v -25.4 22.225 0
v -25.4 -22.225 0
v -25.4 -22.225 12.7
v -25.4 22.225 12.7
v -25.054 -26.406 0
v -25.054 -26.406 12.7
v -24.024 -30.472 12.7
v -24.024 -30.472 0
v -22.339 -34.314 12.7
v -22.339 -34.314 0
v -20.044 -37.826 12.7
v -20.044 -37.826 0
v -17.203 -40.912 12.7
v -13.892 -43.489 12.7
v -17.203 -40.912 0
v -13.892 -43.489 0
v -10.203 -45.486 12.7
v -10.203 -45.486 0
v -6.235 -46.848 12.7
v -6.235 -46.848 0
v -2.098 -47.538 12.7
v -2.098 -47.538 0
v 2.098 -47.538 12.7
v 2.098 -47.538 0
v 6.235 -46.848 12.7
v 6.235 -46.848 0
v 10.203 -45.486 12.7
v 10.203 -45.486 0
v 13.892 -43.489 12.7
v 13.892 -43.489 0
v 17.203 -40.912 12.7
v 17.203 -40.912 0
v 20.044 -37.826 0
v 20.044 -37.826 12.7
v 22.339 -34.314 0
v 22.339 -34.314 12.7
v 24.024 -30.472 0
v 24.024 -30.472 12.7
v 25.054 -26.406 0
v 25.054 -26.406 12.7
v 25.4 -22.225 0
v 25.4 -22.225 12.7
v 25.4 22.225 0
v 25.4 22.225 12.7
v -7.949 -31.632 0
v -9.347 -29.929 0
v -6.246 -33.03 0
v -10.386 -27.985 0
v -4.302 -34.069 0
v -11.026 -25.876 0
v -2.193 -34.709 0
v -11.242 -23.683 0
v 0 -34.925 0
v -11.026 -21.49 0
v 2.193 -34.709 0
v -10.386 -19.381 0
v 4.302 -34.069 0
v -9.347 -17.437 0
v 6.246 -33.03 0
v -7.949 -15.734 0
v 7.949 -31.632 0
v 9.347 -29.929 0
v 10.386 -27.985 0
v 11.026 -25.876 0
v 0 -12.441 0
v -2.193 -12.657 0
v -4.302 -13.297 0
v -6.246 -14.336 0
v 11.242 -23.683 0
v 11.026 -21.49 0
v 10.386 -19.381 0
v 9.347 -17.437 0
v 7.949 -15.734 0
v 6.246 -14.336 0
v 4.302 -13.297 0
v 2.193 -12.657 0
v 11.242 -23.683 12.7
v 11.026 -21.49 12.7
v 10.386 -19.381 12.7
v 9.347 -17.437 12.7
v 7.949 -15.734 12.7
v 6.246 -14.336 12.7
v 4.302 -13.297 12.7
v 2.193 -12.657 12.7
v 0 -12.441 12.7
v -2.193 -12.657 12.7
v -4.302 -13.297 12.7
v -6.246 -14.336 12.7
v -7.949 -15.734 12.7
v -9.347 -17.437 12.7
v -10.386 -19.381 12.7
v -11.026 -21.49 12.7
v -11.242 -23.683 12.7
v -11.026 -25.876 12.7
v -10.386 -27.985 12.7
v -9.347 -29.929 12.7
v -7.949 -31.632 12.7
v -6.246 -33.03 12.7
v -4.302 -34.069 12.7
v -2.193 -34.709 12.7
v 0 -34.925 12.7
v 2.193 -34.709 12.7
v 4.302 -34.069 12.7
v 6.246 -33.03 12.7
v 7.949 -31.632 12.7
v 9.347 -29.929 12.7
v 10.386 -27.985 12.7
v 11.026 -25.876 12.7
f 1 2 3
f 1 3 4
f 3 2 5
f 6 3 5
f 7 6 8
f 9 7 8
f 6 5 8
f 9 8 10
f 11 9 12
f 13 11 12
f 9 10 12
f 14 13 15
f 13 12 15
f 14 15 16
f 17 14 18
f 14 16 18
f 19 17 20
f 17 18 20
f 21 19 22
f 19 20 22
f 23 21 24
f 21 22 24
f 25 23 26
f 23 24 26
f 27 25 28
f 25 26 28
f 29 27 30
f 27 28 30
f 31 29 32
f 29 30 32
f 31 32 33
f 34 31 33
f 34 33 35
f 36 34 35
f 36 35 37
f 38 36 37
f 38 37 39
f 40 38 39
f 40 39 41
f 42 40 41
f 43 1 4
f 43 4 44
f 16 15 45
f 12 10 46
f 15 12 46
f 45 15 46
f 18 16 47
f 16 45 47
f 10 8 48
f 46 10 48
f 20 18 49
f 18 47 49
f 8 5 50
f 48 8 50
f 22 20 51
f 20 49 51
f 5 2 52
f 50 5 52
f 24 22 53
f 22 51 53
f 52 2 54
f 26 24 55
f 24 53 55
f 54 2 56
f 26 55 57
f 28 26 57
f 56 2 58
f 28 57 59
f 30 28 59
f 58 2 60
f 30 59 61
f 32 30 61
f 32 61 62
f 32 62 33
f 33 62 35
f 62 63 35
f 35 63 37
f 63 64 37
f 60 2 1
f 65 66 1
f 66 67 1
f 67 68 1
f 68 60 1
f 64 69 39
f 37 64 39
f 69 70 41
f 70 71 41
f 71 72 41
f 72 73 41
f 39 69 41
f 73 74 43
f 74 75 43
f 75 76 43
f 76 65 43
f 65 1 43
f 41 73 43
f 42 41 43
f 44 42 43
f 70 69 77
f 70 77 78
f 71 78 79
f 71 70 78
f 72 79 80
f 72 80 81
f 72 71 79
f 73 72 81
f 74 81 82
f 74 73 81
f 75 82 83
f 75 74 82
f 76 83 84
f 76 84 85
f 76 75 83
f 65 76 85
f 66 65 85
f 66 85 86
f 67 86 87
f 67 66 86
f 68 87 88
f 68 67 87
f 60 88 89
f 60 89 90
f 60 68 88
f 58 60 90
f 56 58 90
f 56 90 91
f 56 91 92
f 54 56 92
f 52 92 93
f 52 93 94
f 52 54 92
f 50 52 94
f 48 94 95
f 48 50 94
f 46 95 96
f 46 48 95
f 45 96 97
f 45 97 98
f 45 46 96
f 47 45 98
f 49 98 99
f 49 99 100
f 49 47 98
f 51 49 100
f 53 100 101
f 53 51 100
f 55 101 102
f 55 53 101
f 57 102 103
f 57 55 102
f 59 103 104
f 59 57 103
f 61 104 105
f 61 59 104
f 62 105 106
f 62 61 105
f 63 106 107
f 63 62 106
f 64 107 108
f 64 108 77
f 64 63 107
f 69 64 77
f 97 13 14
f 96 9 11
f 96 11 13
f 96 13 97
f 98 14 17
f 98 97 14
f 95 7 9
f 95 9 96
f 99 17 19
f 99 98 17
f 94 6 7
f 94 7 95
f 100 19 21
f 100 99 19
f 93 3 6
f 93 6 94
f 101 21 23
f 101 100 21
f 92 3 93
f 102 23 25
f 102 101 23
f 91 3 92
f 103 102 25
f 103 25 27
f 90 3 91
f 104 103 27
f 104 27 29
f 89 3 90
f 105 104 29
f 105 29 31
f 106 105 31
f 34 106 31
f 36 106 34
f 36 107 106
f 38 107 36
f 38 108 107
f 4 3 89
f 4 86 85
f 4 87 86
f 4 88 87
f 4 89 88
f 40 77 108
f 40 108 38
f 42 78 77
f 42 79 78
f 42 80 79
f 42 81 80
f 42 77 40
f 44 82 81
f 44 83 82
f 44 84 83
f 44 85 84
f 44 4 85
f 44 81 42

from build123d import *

# Parameters (mm, degrees)
F0_W     = 50.8
F0_H     = 44.45
F1_DEPTH = 12.7
F2_R     = 11.241868
F3_DEPTH = 12.7


with BuildPart() as f1:
    # F0 (on Top) → F1 (new body)
    with BuildSketch(Plane.XY):
        with BuildLine():
            ThreePointArc((-25.4, -22.225), (0, -47.625), (25.4, -22.225))
            Line((25.4, -22.225), (-25.4, -22.225))
        make_face()
        Rectangle(F0_W, F0_H)
    extrude(amount=F1_DEPTH)

    # F2 (on Top) → F3 (cut)
    with BuildSketch(Plane.XY):
        with Locations((0, -23.683132)):
            Circle(F2_R)
    extrude(amount=F3_DEPTH, mode=Mode.SUBTRACT)


solid = f1.part
